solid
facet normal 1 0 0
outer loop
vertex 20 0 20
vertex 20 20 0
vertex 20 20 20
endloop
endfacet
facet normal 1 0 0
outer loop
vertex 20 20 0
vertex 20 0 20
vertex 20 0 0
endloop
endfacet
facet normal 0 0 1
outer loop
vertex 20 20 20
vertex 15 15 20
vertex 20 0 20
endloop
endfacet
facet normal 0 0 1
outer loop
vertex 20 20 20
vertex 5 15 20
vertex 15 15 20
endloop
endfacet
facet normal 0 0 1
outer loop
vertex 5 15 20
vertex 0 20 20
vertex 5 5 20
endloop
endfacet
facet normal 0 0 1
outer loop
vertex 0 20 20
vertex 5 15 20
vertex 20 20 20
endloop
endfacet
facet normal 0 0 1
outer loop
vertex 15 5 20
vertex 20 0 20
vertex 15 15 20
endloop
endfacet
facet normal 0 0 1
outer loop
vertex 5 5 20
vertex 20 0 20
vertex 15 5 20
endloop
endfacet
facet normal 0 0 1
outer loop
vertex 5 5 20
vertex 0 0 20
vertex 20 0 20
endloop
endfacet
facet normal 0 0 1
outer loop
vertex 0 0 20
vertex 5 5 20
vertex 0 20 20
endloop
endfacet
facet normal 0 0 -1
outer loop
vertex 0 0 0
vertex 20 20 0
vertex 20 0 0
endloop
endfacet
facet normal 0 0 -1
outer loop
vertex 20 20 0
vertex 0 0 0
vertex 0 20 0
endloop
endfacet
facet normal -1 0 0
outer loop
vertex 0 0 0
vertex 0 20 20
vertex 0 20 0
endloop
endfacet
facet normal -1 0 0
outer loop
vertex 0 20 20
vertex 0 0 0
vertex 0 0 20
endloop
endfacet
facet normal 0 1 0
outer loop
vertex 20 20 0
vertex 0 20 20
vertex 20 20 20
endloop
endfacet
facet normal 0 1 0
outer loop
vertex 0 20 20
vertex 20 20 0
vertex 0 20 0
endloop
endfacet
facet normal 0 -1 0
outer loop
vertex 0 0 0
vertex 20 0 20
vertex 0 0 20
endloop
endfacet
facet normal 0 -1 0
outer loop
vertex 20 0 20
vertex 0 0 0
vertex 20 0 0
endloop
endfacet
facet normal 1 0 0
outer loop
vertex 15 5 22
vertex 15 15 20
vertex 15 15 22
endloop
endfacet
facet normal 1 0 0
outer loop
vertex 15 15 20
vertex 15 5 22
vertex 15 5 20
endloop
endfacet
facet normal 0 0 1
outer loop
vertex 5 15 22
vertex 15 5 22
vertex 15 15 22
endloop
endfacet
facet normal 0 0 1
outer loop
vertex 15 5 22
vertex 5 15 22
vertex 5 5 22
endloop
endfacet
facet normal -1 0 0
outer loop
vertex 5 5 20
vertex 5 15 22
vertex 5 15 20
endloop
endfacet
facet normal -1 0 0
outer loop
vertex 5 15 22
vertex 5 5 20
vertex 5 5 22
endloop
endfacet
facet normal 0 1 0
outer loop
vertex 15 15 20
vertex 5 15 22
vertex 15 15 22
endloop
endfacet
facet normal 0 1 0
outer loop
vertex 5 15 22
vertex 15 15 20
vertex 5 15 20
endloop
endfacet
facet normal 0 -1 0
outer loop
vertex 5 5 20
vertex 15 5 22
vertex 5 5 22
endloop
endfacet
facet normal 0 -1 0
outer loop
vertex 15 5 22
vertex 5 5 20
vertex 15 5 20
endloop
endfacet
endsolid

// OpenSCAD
color("white") cube(20, $fillet = 2);
color("red") translate([5,5,19]) cube([10,10,3]);
